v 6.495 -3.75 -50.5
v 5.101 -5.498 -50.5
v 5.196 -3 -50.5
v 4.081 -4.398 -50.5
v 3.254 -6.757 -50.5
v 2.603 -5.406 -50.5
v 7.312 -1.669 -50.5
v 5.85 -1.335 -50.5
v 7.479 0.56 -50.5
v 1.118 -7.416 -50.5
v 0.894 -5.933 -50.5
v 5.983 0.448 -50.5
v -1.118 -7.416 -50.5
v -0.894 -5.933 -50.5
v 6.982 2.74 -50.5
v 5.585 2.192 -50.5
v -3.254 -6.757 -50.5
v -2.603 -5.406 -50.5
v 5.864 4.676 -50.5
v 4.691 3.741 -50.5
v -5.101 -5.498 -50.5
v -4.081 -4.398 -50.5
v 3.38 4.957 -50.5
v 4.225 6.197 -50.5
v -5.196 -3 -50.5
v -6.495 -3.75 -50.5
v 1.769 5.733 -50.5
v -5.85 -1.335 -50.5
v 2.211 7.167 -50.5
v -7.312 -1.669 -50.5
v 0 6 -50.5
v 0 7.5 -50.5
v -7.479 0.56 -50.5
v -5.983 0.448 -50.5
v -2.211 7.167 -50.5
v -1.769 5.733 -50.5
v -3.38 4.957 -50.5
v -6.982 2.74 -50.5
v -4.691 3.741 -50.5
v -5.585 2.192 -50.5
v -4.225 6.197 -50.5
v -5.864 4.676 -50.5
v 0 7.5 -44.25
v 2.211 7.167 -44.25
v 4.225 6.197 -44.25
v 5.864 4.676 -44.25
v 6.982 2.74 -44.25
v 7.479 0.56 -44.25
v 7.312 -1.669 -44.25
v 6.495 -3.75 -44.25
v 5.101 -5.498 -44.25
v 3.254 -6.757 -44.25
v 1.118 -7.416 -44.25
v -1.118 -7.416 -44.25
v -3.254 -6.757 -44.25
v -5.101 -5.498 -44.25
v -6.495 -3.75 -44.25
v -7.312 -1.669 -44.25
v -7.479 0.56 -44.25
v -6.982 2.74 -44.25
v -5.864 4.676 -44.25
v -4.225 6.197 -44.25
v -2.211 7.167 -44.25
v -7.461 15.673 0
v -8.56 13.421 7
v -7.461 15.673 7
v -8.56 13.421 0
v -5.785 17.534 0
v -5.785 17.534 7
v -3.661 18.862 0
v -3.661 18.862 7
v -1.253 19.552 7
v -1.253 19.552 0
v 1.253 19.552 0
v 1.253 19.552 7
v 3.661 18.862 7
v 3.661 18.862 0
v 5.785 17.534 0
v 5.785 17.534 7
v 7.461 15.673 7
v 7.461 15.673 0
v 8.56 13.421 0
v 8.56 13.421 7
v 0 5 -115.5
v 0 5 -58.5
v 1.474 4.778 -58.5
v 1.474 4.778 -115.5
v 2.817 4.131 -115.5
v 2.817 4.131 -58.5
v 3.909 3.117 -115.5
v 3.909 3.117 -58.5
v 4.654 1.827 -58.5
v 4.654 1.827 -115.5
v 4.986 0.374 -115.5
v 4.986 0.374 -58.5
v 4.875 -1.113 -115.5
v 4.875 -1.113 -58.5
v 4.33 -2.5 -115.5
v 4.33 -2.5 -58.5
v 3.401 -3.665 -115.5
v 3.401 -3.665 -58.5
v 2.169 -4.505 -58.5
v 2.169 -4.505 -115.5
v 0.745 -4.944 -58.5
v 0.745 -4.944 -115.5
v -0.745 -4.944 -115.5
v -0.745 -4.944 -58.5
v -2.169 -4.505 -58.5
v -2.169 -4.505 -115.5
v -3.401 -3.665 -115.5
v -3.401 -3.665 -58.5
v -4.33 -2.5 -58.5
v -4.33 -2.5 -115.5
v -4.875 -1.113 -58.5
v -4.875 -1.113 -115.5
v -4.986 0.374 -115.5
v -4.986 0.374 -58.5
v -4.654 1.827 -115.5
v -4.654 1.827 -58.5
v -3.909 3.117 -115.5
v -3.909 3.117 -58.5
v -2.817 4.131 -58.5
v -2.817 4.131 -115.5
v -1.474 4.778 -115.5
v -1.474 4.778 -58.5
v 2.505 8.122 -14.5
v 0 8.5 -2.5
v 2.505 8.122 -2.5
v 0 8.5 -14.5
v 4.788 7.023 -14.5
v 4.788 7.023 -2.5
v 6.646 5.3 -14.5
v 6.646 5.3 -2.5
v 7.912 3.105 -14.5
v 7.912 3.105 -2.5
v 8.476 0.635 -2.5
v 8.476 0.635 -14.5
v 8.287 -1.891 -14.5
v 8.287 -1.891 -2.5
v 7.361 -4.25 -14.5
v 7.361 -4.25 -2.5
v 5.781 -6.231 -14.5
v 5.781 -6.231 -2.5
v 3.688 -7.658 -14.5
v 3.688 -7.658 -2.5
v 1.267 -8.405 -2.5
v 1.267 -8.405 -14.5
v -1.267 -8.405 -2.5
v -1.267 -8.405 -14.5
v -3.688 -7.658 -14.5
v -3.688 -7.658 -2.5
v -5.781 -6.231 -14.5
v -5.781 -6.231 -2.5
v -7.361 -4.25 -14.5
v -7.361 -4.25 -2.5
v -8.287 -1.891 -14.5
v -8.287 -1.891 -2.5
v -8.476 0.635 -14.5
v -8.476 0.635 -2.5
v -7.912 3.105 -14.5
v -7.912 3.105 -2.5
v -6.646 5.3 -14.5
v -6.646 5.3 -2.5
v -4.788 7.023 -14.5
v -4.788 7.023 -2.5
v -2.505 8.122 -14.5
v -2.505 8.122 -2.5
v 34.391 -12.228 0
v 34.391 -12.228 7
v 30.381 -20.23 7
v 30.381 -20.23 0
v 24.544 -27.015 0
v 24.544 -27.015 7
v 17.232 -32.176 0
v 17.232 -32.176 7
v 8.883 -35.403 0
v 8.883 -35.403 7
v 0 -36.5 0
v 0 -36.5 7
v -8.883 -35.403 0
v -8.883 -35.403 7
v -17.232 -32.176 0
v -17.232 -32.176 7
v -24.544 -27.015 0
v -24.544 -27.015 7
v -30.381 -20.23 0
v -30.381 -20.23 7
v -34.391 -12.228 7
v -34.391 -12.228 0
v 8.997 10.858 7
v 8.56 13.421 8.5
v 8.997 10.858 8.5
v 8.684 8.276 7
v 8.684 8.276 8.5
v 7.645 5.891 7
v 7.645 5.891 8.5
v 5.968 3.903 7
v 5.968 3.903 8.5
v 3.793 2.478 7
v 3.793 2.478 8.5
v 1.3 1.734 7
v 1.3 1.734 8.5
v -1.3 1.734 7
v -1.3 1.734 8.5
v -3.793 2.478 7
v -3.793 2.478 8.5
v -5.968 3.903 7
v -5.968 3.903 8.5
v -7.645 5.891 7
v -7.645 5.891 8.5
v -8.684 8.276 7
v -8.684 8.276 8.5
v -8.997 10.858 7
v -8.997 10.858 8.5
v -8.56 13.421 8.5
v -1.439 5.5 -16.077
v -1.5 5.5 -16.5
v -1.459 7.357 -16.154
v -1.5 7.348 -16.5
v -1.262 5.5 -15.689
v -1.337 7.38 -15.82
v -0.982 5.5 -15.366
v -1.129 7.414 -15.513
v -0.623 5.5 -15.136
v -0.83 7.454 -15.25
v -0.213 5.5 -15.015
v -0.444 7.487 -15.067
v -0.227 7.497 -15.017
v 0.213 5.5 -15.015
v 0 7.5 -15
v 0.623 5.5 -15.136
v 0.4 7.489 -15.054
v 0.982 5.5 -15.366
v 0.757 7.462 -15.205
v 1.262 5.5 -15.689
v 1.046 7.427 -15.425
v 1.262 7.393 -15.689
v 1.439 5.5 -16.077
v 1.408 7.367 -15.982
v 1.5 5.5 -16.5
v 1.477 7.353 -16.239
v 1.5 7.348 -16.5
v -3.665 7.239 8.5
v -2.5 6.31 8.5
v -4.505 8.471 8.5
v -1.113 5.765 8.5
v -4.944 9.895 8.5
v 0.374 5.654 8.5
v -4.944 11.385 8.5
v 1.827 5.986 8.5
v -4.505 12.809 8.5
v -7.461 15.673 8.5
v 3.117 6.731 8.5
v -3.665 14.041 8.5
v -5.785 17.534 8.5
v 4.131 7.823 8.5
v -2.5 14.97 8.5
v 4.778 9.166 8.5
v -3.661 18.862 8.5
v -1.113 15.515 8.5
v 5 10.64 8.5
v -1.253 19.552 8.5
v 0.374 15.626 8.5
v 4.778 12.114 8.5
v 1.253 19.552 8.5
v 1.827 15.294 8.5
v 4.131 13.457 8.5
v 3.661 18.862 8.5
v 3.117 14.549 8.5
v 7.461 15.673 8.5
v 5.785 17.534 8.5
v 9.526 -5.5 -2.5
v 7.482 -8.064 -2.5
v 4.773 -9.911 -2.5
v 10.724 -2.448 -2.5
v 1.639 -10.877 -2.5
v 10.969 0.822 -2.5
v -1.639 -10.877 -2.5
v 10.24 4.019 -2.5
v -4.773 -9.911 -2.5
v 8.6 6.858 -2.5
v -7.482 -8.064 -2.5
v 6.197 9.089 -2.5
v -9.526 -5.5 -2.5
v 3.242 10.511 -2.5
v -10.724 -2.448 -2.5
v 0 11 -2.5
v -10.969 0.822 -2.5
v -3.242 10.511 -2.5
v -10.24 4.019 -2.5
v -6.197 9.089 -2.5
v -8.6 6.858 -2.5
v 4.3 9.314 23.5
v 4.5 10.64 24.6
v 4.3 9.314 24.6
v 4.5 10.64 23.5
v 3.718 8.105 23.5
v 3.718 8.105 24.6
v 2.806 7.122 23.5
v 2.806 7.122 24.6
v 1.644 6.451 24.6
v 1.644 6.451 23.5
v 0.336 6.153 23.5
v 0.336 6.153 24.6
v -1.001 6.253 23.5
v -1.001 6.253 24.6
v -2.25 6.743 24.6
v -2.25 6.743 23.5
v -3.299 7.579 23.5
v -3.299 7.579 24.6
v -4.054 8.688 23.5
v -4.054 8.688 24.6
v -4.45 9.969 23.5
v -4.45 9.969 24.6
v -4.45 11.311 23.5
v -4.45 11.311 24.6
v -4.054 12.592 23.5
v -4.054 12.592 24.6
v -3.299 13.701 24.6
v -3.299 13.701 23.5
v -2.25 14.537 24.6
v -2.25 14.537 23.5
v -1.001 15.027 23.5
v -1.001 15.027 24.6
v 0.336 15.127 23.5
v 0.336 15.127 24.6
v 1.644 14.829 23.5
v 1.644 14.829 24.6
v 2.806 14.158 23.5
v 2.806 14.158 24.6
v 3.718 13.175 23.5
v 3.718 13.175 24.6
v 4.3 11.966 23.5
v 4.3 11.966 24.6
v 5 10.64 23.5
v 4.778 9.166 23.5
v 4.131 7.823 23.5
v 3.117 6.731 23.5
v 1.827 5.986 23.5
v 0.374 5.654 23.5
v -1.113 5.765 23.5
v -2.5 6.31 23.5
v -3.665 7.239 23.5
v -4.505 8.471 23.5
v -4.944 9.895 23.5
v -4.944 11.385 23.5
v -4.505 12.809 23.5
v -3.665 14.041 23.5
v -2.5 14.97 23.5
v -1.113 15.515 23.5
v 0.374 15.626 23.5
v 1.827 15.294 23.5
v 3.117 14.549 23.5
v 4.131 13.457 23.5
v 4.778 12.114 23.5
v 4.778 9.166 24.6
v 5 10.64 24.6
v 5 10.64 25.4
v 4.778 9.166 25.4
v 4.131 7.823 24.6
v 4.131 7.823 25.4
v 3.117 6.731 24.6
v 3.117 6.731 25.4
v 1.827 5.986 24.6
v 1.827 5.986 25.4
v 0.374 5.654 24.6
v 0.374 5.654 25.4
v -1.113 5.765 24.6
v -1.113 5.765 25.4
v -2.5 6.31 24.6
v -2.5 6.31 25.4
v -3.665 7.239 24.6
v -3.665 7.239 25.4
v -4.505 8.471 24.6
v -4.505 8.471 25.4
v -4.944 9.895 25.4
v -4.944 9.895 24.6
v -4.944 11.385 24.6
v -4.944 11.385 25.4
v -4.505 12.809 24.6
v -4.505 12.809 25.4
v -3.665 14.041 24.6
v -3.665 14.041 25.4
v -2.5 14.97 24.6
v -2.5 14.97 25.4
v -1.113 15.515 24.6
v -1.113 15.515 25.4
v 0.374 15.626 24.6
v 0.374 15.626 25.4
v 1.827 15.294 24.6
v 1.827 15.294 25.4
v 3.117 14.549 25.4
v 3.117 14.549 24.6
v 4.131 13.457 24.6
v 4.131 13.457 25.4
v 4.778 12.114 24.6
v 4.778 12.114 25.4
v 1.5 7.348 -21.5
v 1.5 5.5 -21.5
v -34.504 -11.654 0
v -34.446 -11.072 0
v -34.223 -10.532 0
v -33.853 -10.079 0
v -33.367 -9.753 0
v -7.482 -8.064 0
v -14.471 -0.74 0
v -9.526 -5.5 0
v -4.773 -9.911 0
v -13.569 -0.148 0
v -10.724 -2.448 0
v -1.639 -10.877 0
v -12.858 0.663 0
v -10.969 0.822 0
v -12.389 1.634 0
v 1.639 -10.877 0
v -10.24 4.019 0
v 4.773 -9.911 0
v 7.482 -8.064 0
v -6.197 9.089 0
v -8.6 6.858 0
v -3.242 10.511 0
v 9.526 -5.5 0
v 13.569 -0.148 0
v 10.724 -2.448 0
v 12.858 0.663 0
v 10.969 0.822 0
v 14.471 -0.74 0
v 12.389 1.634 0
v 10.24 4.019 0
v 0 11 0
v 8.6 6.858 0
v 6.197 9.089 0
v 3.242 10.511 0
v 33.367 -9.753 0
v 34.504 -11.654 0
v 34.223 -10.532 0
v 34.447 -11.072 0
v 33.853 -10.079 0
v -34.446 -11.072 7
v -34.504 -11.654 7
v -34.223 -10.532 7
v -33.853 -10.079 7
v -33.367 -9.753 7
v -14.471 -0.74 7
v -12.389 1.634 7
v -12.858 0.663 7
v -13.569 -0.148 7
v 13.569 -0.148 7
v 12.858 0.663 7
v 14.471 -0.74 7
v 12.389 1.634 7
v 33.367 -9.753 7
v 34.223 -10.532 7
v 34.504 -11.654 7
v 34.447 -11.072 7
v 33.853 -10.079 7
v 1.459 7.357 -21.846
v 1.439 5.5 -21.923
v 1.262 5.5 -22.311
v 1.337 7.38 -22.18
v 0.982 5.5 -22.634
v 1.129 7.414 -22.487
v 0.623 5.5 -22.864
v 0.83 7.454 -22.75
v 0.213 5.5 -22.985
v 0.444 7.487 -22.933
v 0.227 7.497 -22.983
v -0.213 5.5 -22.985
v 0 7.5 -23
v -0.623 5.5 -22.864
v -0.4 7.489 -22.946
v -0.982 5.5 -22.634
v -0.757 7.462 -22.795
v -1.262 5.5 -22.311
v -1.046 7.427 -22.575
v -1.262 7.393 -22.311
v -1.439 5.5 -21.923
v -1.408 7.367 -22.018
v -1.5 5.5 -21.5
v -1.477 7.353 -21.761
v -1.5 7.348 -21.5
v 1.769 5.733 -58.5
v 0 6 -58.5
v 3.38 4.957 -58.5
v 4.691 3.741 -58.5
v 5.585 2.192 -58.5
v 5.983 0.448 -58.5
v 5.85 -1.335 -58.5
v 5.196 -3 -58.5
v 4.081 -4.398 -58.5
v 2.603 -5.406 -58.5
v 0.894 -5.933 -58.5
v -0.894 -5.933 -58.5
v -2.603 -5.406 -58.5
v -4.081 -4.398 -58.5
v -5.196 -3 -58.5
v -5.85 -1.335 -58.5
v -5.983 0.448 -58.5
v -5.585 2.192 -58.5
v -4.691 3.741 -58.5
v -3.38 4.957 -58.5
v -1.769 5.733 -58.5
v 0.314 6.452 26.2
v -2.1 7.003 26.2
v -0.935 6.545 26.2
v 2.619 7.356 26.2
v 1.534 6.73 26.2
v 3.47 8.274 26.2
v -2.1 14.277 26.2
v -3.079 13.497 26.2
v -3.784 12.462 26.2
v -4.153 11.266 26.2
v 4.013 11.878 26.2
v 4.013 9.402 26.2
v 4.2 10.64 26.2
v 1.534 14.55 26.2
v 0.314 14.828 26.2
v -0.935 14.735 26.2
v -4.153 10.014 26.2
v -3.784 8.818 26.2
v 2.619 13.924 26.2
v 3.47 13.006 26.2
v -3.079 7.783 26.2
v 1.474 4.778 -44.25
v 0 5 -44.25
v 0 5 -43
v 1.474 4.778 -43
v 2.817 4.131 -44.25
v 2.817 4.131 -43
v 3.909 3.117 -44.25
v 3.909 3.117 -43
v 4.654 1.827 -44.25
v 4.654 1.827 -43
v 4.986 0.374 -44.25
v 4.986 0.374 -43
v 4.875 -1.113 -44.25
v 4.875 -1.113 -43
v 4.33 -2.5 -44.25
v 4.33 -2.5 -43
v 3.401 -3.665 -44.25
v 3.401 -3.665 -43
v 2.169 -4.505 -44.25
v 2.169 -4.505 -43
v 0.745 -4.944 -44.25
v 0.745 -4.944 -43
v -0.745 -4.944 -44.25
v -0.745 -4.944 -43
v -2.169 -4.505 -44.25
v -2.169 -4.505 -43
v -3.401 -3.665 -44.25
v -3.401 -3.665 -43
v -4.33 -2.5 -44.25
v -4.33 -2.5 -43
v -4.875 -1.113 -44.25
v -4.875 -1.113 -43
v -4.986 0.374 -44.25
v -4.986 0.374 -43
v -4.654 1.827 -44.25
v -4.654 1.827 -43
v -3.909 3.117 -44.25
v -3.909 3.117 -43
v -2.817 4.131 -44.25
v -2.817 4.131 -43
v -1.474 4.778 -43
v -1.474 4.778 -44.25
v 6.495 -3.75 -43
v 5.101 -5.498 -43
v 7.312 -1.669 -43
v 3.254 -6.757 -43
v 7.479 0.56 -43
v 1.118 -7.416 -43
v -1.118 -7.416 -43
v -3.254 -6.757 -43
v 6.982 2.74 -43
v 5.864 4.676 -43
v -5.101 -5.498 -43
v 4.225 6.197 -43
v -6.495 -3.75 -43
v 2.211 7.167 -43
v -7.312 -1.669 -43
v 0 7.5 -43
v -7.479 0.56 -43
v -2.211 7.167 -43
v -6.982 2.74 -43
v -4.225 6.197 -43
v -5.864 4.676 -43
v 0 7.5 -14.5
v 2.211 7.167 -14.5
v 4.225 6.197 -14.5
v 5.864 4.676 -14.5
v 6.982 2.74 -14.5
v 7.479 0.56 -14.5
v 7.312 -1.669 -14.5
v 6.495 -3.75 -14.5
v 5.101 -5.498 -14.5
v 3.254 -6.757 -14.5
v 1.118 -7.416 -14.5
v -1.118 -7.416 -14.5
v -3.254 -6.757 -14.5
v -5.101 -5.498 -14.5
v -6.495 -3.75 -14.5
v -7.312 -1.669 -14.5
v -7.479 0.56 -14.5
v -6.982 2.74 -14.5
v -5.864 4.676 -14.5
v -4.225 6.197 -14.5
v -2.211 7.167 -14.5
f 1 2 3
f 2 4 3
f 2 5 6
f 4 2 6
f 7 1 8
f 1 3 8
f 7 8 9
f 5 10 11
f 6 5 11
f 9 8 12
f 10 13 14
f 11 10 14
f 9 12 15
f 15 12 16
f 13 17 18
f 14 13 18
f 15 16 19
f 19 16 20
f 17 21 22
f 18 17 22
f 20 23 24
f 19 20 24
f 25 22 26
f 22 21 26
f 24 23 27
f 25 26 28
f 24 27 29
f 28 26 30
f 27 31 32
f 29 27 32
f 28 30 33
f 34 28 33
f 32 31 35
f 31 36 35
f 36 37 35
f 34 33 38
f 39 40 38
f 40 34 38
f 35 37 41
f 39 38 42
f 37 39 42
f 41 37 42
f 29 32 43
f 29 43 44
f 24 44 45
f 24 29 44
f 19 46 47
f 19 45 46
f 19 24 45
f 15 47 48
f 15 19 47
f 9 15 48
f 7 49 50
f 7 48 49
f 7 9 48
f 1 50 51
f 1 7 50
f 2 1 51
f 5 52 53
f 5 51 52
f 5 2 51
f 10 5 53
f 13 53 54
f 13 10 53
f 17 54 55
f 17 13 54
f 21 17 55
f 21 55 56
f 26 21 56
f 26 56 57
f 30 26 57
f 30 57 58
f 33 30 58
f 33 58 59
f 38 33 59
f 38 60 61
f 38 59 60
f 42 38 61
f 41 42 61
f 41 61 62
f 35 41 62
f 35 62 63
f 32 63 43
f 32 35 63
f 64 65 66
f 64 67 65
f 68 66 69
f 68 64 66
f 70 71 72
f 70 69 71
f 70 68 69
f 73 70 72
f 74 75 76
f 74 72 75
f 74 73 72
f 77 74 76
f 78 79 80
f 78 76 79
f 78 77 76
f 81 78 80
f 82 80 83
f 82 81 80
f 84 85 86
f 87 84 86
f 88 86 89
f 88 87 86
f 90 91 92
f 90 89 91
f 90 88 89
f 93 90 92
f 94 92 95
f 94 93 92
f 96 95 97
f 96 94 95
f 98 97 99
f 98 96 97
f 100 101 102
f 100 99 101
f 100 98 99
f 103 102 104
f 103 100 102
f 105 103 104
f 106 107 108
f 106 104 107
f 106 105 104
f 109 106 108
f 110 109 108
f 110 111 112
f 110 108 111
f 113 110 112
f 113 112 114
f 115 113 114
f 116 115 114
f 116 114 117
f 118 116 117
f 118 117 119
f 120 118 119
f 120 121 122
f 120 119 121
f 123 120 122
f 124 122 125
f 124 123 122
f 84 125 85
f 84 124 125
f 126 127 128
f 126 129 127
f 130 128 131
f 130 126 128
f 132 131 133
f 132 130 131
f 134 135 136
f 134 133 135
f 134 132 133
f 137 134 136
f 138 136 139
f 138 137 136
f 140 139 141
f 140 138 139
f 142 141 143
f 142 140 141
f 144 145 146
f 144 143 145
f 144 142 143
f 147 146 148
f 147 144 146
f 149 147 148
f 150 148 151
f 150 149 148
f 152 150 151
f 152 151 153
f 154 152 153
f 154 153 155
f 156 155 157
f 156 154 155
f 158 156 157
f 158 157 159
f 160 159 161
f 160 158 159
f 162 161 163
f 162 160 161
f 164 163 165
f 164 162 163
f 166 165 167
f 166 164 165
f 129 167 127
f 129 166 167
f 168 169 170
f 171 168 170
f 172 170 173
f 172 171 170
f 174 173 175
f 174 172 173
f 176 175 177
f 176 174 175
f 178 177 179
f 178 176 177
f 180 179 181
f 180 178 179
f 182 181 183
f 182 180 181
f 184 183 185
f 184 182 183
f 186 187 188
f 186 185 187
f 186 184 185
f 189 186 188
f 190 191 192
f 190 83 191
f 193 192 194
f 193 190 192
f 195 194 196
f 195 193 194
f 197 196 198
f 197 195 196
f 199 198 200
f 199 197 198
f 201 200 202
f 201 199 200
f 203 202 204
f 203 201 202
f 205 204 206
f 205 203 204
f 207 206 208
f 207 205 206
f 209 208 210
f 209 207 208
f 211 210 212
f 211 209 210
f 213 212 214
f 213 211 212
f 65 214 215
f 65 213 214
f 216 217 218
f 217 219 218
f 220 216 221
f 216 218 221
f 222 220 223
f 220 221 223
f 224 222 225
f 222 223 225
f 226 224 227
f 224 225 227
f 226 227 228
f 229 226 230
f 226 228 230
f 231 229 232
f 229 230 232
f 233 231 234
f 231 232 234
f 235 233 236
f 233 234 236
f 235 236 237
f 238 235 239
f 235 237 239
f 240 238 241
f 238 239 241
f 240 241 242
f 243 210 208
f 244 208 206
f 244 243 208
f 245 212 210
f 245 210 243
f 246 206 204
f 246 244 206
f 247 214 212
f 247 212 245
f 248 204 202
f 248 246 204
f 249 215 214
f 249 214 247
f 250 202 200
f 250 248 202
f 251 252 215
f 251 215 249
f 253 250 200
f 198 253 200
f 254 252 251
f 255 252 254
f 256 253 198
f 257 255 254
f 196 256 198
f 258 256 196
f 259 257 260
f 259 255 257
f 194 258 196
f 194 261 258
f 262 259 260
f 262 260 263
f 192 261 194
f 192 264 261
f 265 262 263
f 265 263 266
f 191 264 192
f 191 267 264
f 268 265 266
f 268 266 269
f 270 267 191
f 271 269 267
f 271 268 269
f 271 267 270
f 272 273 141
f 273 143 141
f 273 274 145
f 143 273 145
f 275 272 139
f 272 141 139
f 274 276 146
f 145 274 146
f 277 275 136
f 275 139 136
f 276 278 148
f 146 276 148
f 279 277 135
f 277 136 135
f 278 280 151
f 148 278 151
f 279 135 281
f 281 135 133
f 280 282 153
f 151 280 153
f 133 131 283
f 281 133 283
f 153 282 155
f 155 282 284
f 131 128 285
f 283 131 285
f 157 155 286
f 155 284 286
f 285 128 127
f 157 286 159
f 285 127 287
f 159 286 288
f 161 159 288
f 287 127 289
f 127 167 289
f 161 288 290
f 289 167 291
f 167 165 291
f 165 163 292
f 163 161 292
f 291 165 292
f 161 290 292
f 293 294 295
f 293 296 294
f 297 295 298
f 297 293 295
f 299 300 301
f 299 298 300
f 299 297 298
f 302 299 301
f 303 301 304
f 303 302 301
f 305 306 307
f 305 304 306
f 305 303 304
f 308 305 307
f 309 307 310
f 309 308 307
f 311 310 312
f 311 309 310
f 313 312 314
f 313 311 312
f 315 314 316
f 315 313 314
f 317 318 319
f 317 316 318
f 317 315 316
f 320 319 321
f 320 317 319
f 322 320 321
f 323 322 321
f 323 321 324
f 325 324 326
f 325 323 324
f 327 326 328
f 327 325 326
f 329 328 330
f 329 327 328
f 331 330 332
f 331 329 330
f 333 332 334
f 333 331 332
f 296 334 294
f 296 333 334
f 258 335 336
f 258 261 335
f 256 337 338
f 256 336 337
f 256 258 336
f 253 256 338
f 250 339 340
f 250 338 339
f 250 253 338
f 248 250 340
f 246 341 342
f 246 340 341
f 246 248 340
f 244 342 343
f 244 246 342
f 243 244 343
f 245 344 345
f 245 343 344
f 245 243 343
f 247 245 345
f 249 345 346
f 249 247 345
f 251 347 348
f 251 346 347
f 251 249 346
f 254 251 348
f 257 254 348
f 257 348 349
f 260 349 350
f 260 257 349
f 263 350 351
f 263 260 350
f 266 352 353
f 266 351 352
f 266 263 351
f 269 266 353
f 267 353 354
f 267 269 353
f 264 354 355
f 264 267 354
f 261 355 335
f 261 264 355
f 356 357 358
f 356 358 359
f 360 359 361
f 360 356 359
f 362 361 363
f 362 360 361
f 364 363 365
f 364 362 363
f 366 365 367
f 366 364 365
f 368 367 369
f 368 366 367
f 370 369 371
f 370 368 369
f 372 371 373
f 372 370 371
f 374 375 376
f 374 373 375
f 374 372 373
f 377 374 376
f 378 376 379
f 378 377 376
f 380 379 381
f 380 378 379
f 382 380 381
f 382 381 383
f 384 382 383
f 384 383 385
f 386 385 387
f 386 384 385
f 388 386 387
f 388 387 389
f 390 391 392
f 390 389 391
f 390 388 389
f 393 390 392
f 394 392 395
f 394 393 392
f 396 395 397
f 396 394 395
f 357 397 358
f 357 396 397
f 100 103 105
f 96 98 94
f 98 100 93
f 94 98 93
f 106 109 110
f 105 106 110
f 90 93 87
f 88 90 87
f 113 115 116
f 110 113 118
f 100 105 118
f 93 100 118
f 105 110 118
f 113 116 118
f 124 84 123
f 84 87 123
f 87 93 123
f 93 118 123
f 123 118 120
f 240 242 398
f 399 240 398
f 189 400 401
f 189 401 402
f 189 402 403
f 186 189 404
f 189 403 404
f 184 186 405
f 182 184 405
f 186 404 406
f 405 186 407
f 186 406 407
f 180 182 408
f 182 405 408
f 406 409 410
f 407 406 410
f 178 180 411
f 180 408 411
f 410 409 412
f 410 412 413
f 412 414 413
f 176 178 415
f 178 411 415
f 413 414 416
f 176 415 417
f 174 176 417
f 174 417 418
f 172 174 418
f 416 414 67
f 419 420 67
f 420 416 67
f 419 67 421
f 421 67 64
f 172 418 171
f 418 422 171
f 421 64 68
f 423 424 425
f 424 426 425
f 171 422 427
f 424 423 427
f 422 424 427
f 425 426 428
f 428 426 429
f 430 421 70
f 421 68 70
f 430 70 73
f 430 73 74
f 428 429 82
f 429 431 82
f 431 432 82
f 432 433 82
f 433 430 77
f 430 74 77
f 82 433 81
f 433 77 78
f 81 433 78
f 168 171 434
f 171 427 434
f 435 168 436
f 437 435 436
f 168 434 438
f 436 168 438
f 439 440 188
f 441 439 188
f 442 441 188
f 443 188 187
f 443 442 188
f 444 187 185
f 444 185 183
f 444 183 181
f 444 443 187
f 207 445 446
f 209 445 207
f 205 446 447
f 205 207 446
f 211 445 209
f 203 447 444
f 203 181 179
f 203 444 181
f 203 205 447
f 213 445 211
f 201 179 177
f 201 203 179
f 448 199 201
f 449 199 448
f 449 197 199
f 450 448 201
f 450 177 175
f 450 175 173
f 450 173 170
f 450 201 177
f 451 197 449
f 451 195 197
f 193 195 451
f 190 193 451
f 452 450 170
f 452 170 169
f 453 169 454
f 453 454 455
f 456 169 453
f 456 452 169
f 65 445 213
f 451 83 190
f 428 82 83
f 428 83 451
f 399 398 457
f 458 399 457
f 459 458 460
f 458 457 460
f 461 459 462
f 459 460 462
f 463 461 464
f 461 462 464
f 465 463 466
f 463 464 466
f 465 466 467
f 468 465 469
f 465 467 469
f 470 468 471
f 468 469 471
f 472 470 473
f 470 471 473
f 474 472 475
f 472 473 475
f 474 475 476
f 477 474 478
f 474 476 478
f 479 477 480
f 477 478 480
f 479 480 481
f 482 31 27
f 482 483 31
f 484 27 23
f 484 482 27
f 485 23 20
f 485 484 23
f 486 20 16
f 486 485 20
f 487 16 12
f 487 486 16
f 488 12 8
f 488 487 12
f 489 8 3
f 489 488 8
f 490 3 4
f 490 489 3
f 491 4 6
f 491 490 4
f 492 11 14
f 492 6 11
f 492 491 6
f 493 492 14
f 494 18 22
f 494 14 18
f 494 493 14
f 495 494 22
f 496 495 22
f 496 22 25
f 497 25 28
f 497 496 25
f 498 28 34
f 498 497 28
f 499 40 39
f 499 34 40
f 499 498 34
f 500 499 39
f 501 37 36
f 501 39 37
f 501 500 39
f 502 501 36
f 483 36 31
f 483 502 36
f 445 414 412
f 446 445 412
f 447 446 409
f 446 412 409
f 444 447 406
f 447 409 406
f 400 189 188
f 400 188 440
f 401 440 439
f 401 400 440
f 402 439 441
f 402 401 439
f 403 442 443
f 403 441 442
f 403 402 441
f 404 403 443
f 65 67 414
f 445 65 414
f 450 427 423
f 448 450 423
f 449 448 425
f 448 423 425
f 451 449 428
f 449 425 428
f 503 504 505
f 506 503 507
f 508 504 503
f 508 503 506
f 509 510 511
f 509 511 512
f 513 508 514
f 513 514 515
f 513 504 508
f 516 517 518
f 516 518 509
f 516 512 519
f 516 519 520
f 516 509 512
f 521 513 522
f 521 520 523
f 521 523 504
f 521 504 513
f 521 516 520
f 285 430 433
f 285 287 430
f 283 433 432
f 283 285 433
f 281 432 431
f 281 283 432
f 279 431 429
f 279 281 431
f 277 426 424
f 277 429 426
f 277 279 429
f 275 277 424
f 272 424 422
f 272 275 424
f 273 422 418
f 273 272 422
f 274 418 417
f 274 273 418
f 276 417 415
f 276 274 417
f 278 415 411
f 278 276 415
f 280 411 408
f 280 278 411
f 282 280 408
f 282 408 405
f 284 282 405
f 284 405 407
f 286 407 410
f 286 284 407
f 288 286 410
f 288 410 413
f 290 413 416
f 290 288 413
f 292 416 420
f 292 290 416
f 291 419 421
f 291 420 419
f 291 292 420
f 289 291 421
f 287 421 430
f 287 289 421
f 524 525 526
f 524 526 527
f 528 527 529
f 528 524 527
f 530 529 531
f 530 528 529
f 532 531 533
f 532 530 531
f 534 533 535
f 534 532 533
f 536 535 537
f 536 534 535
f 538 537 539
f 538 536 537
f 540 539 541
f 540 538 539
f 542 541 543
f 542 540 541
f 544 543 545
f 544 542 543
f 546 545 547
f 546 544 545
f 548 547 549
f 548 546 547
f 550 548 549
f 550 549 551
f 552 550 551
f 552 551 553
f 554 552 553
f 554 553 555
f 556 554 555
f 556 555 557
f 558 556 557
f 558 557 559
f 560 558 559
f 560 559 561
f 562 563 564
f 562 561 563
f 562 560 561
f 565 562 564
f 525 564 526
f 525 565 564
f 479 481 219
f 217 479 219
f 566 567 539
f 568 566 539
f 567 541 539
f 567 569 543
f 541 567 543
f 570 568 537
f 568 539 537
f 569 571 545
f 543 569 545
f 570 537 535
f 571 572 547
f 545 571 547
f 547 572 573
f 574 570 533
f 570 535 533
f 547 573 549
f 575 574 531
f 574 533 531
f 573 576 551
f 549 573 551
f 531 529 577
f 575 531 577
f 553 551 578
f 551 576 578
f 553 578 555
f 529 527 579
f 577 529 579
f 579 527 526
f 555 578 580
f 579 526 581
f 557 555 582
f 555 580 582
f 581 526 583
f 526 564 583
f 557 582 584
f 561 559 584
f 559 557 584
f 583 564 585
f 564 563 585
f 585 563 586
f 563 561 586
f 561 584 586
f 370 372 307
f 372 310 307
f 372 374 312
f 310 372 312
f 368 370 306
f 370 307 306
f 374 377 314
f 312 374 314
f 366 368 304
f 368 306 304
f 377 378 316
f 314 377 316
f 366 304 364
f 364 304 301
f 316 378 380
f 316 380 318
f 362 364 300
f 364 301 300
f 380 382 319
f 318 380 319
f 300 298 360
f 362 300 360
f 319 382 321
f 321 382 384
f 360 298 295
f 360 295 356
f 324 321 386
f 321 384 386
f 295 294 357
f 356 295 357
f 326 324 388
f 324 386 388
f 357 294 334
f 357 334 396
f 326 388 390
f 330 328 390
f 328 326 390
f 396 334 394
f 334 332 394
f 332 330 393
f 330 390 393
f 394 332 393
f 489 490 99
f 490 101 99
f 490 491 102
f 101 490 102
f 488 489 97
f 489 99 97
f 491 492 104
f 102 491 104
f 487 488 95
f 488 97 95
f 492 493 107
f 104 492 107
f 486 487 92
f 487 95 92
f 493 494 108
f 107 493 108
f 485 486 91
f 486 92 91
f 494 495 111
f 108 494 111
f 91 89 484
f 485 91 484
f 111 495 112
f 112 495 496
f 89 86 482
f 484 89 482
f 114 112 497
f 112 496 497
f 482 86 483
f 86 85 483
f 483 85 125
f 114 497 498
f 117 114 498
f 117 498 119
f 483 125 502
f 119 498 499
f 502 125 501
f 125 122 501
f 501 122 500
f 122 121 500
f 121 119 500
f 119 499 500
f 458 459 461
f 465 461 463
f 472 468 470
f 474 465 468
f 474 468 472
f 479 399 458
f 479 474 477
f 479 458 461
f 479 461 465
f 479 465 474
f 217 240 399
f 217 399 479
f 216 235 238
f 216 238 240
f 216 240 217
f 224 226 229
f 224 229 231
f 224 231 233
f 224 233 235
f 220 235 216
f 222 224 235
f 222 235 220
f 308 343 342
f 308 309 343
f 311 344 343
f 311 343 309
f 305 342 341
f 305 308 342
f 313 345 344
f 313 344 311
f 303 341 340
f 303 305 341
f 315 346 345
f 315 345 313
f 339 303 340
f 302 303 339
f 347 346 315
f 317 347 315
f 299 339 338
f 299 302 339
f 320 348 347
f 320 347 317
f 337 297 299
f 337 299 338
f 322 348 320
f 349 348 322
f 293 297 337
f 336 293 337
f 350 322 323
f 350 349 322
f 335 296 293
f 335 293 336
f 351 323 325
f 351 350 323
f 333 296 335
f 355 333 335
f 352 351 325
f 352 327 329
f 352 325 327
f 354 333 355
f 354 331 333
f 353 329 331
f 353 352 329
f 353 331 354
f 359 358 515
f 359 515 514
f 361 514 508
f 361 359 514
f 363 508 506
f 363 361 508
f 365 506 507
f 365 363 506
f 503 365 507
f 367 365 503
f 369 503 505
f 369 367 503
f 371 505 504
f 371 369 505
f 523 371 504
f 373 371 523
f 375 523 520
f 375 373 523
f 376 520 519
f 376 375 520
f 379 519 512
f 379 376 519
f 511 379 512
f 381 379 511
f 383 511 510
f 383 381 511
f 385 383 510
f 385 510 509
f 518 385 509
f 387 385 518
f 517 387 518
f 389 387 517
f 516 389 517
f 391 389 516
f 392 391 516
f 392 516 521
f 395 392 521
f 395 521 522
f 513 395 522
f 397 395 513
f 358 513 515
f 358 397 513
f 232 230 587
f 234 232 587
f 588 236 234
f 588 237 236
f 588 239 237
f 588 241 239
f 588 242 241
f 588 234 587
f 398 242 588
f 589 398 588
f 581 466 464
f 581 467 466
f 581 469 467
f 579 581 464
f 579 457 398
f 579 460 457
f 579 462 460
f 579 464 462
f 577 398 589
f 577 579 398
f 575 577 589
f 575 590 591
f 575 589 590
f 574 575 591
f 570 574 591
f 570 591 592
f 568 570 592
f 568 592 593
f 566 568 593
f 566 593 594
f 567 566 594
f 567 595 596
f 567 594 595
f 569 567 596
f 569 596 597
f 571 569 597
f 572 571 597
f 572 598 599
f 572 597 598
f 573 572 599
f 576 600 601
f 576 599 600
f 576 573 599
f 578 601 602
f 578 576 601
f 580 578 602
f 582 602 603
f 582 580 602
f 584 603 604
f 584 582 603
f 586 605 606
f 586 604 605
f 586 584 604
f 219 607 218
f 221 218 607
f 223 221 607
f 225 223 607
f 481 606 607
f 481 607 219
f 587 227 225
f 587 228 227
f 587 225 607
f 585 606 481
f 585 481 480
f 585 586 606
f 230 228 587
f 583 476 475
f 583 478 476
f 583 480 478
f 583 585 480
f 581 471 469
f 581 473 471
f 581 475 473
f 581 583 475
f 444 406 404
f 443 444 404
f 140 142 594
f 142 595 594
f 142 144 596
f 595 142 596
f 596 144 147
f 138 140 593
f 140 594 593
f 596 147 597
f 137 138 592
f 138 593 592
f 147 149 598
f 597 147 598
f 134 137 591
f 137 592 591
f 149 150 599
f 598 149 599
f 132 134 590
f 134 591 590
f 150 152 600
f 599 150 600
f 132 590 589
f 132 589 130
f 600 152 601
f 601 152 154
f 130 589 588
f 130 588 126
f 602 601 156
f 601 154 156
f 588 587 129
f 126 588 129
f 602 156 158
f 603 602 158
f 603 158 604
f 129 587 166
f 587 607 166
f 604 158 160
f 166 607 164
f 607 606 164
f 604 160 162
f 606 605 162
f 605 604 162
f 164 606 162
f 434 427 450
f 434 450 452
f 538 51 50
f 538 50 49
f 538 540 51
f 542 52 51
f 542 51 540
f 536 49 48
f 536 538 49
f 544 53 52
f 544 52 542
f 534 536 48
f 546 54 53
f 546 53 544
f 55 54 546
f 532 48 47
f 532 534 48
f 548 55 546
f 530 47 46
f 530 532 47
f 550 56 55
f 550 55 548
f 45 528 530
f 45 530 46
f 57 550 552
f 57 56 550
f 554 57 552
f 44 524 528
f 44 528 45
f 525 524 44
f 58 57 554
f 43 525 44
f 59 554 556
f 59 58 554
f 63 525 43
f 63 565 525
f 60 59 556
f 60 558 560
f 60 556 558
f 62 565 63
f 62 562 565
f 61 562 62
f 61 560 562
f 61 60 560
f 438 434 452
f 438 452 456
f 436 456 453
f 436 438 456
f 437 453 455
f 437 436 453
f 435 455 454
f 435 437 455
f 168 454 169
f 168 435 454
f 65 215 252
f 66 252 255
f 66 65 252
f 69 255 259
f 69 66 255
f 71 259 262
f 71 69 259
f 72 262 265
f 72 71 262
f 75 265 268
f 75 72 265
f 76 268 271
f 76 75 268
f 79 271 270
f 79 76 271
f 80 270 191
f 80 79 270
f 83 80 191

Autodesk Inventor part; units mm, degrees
ref_plane "YZ Plane" through (0, 0, 0) normal (1, 0, 0) x (0, 1, 0)
ref_plane "XY Plane" through (0, 0, 0) normal (0, 0, 1) x (1, 0, 0)
sketch "Sketch1" plane through (0, 0, 0) normal (1, 0, 0) x (0, 1, 0)
  line L0 (0, 0) -> (11, 0)
  line L1 (11, 0) -> (11, -2.5)
  line L2 (11, -2.5) -> (8.5, -2.5)
  line L3 (8.5, -2.5) -> (8.5, -14.5)
  line L4 (8.5, -14.5) -> (7.5, -14.5)
  line L5 (7.5, -14.5) -> (7.5, -43)
  line L6 (7.5, -43) -> (5, -43)
  line L7 (5, -43) -> (5, -44.25)
  line L8 (5, -44.25) -> (7.5, -44.25)
  line L9 (7.5, -44.25) -> (7.5, -50.5)
  line L10 (7.5, -50.5) -> (6, -50.5)
  line L11 (6, -50.5) -> (6, -58.5)
  line L12 (6, -58.5) -> (5, -58.5)
  line L13 (5, -58.5) -> (5, -115.5)
  line L14 (5, -115.5) -> (0, -115.5)
  line L15 (0, -115.5) -> (0, 0)
  dimension "d0" = 5
  dimension "d1" = 6
  dimension "d2" = 7.5
  dimension "d3" = 5
  dimension "d4" = 8.5
  dimension "d5" = 7.5
  dimension "d6" = 11
  dimension "d7" = 2.5
  dimension "d8" = 12
  dimension "d9" = 1.25
  dimension "d10" = 6.25
  dimension "d12" = 57
  dimension "d13" = 65
  dimension "d14" = 28.5
revolve "Revolution1" add sketch "Sketch1" angle 360 about axis through (0, 0, -115.5) along (0, 0, 1)
sketch "Sketch2" plane through (0, 0, 0) normal (0, 0, 1) x (1, 0, 0)
  circle A0 centre (0, 10.64) radius 9
  arc A1 (-34.3908, -12.228) -> (34.3908, -12.228) centre (0, 0) ccw
  line L0 (0, 0) -> (118.8939, 0) construction
  line L1 (8.5595, 13.4212) -> (12.3892, 1.6344)
  circle A2 centre (0, 0) radius 5 construction
  line L2 (0, 0) -> (0, 32.7762) construction
  line L3 (14.4714, -0.7398) -> (33.3674, -9.7528)
  line L4 (-8.5595, 13.4212) -> (-12.3892, 1.6344)
  line L5 (-14.4714, -0.7398) -> (-33.3674, -9.7528)
  arc A3 (12.3892, 1.6344) -> (14.4714, -0.7398) centre (16.1935, 2.8705) ccw
  arc A4 (-14.4714, -0.7398) -> (-12.3892, 1.6344) centre (-16.1935, 2.8705) ccw
  arc A5 (34.3908, -12.228) -> (33.3674, -9.7528) centre (32.5064, -11.5579) ccw
  arc A6 (-33.3674, -9.7528) -> (-34.3908, -12.228) centre (-32.5064, -11.5579) ccw
  line L6 (0, 19.64) -> (56.14, 19.64) construction
  line L7 (0, -36.5) -> (89.4441, -36.5) construction
  point P0 (34.9542, -10.5096)
  point P1 (-34.9542, -10.5096)
  point P2 (-12.9203, 0)
  point P3 (12.9203, 0)
  dimension "d16" = 18
  dimension "d17" = 73
  dimension "d18" = 10.64
  dimension "d19" = 18
  dimension "d20" = 25.5
  dimension "d21" = 4
  dimension "d22" = 2
  dimension "d24" = 56.14
  dimension "d25" = 18
  dimension "d26" = 25.5
extrude "Extrusion1" add sketch "Sketch2" along normal blind 7
sketch "Sketch3" plane through (0, 0, 7) normal (0, 0, 1) x (1, 0, 0)
  arc A0 (8.5595, 13.4212) -> (-8.5595, 13.4212) centre (0, 10.64) ccw projected
  circle A1 centre (0, 10.64) radius 9 projected
  point P0 (0, 0)
extrude "Extrusion2" add sketch "Sketch3" along normal blind 1.5
sketch "Sketch4" plane through (0, 10.64, 8.5) normal (0, 0, 1) x (1, 0, 0)
  circle A0 centre (0, 0) radius 5
  point P0 (0, -10.64)
  dimension "d31" = 10
extrude "Extrusion3" add sketch "Sketch4" along normal blind 15
sketch "Sketch5" plane through (0, 10.64, 23.5) normal (0, 0, 1) x (1, 0, 0)
  circle A0 centre (0, 0) radius 4.5
  circle A1 centre (0, 0) radius 9 construction
  point P0 (0, -10.64)
  dimension "d35" = 9
extrude "Extrusion4" add sketch "Sketch5" along normal blind 1.1
sketch "Sketch6" plane through (0, 10.64, 24.6) normal (0, 0, 1) x (1, 0, 0)
  circle A0 centre (0, 0) radius 5
  point P0 (0, -10.64)
  dimension "d38" = 10
extrude "Extrusion5" add sketch "Sketch6" along normal blind 1.6
chamfer "Chamfer1" distance 0.8 angle 45 1 edges at (-5, 10.64, 26.2) measured on face at (0.4847, 10.64, 26.2)
thread "Thread1" size "M10x1.5" class "6g" standard "ISO Metric profile" length 28
ref_plane "Work Plane1" through (0, 7.5, -28.75) normal (0, 1, 0) x (-1, 0, 0)
sketch "Sketch7" plane through (0, 7.5, -28.75) normal (0, 1, 0) x (-1, 0, 0)
  line L0 (-8.5, 14.25) -> (8.5, 14.25) construction
  line L1 (0, 12.25) -> (0, 7.25) construction
  line L2 (-1.5, 12.25) -> (-1.5, 7.25)
  line L3 (1.5, 7.25) -> (1.5, 12.25)
  arc A0 (1.5, 12.25) -> (-1.5, 12.25) centre (0, 12.25) ccw
  arc A1 (-1.5, 7.25) -> (1.5, 7.25) centre (0, 7.25) ccw
  point P0 (0, 28.75)
  point P1 (0, 9.75)
  dimension "d46" = 1.5
  dimension "d47" = 5
  dimension "d48" = 0.5
extrude "Extrusion6" cut sketch "Sketch7" against normal blind 2
properties part number "Shaft"
